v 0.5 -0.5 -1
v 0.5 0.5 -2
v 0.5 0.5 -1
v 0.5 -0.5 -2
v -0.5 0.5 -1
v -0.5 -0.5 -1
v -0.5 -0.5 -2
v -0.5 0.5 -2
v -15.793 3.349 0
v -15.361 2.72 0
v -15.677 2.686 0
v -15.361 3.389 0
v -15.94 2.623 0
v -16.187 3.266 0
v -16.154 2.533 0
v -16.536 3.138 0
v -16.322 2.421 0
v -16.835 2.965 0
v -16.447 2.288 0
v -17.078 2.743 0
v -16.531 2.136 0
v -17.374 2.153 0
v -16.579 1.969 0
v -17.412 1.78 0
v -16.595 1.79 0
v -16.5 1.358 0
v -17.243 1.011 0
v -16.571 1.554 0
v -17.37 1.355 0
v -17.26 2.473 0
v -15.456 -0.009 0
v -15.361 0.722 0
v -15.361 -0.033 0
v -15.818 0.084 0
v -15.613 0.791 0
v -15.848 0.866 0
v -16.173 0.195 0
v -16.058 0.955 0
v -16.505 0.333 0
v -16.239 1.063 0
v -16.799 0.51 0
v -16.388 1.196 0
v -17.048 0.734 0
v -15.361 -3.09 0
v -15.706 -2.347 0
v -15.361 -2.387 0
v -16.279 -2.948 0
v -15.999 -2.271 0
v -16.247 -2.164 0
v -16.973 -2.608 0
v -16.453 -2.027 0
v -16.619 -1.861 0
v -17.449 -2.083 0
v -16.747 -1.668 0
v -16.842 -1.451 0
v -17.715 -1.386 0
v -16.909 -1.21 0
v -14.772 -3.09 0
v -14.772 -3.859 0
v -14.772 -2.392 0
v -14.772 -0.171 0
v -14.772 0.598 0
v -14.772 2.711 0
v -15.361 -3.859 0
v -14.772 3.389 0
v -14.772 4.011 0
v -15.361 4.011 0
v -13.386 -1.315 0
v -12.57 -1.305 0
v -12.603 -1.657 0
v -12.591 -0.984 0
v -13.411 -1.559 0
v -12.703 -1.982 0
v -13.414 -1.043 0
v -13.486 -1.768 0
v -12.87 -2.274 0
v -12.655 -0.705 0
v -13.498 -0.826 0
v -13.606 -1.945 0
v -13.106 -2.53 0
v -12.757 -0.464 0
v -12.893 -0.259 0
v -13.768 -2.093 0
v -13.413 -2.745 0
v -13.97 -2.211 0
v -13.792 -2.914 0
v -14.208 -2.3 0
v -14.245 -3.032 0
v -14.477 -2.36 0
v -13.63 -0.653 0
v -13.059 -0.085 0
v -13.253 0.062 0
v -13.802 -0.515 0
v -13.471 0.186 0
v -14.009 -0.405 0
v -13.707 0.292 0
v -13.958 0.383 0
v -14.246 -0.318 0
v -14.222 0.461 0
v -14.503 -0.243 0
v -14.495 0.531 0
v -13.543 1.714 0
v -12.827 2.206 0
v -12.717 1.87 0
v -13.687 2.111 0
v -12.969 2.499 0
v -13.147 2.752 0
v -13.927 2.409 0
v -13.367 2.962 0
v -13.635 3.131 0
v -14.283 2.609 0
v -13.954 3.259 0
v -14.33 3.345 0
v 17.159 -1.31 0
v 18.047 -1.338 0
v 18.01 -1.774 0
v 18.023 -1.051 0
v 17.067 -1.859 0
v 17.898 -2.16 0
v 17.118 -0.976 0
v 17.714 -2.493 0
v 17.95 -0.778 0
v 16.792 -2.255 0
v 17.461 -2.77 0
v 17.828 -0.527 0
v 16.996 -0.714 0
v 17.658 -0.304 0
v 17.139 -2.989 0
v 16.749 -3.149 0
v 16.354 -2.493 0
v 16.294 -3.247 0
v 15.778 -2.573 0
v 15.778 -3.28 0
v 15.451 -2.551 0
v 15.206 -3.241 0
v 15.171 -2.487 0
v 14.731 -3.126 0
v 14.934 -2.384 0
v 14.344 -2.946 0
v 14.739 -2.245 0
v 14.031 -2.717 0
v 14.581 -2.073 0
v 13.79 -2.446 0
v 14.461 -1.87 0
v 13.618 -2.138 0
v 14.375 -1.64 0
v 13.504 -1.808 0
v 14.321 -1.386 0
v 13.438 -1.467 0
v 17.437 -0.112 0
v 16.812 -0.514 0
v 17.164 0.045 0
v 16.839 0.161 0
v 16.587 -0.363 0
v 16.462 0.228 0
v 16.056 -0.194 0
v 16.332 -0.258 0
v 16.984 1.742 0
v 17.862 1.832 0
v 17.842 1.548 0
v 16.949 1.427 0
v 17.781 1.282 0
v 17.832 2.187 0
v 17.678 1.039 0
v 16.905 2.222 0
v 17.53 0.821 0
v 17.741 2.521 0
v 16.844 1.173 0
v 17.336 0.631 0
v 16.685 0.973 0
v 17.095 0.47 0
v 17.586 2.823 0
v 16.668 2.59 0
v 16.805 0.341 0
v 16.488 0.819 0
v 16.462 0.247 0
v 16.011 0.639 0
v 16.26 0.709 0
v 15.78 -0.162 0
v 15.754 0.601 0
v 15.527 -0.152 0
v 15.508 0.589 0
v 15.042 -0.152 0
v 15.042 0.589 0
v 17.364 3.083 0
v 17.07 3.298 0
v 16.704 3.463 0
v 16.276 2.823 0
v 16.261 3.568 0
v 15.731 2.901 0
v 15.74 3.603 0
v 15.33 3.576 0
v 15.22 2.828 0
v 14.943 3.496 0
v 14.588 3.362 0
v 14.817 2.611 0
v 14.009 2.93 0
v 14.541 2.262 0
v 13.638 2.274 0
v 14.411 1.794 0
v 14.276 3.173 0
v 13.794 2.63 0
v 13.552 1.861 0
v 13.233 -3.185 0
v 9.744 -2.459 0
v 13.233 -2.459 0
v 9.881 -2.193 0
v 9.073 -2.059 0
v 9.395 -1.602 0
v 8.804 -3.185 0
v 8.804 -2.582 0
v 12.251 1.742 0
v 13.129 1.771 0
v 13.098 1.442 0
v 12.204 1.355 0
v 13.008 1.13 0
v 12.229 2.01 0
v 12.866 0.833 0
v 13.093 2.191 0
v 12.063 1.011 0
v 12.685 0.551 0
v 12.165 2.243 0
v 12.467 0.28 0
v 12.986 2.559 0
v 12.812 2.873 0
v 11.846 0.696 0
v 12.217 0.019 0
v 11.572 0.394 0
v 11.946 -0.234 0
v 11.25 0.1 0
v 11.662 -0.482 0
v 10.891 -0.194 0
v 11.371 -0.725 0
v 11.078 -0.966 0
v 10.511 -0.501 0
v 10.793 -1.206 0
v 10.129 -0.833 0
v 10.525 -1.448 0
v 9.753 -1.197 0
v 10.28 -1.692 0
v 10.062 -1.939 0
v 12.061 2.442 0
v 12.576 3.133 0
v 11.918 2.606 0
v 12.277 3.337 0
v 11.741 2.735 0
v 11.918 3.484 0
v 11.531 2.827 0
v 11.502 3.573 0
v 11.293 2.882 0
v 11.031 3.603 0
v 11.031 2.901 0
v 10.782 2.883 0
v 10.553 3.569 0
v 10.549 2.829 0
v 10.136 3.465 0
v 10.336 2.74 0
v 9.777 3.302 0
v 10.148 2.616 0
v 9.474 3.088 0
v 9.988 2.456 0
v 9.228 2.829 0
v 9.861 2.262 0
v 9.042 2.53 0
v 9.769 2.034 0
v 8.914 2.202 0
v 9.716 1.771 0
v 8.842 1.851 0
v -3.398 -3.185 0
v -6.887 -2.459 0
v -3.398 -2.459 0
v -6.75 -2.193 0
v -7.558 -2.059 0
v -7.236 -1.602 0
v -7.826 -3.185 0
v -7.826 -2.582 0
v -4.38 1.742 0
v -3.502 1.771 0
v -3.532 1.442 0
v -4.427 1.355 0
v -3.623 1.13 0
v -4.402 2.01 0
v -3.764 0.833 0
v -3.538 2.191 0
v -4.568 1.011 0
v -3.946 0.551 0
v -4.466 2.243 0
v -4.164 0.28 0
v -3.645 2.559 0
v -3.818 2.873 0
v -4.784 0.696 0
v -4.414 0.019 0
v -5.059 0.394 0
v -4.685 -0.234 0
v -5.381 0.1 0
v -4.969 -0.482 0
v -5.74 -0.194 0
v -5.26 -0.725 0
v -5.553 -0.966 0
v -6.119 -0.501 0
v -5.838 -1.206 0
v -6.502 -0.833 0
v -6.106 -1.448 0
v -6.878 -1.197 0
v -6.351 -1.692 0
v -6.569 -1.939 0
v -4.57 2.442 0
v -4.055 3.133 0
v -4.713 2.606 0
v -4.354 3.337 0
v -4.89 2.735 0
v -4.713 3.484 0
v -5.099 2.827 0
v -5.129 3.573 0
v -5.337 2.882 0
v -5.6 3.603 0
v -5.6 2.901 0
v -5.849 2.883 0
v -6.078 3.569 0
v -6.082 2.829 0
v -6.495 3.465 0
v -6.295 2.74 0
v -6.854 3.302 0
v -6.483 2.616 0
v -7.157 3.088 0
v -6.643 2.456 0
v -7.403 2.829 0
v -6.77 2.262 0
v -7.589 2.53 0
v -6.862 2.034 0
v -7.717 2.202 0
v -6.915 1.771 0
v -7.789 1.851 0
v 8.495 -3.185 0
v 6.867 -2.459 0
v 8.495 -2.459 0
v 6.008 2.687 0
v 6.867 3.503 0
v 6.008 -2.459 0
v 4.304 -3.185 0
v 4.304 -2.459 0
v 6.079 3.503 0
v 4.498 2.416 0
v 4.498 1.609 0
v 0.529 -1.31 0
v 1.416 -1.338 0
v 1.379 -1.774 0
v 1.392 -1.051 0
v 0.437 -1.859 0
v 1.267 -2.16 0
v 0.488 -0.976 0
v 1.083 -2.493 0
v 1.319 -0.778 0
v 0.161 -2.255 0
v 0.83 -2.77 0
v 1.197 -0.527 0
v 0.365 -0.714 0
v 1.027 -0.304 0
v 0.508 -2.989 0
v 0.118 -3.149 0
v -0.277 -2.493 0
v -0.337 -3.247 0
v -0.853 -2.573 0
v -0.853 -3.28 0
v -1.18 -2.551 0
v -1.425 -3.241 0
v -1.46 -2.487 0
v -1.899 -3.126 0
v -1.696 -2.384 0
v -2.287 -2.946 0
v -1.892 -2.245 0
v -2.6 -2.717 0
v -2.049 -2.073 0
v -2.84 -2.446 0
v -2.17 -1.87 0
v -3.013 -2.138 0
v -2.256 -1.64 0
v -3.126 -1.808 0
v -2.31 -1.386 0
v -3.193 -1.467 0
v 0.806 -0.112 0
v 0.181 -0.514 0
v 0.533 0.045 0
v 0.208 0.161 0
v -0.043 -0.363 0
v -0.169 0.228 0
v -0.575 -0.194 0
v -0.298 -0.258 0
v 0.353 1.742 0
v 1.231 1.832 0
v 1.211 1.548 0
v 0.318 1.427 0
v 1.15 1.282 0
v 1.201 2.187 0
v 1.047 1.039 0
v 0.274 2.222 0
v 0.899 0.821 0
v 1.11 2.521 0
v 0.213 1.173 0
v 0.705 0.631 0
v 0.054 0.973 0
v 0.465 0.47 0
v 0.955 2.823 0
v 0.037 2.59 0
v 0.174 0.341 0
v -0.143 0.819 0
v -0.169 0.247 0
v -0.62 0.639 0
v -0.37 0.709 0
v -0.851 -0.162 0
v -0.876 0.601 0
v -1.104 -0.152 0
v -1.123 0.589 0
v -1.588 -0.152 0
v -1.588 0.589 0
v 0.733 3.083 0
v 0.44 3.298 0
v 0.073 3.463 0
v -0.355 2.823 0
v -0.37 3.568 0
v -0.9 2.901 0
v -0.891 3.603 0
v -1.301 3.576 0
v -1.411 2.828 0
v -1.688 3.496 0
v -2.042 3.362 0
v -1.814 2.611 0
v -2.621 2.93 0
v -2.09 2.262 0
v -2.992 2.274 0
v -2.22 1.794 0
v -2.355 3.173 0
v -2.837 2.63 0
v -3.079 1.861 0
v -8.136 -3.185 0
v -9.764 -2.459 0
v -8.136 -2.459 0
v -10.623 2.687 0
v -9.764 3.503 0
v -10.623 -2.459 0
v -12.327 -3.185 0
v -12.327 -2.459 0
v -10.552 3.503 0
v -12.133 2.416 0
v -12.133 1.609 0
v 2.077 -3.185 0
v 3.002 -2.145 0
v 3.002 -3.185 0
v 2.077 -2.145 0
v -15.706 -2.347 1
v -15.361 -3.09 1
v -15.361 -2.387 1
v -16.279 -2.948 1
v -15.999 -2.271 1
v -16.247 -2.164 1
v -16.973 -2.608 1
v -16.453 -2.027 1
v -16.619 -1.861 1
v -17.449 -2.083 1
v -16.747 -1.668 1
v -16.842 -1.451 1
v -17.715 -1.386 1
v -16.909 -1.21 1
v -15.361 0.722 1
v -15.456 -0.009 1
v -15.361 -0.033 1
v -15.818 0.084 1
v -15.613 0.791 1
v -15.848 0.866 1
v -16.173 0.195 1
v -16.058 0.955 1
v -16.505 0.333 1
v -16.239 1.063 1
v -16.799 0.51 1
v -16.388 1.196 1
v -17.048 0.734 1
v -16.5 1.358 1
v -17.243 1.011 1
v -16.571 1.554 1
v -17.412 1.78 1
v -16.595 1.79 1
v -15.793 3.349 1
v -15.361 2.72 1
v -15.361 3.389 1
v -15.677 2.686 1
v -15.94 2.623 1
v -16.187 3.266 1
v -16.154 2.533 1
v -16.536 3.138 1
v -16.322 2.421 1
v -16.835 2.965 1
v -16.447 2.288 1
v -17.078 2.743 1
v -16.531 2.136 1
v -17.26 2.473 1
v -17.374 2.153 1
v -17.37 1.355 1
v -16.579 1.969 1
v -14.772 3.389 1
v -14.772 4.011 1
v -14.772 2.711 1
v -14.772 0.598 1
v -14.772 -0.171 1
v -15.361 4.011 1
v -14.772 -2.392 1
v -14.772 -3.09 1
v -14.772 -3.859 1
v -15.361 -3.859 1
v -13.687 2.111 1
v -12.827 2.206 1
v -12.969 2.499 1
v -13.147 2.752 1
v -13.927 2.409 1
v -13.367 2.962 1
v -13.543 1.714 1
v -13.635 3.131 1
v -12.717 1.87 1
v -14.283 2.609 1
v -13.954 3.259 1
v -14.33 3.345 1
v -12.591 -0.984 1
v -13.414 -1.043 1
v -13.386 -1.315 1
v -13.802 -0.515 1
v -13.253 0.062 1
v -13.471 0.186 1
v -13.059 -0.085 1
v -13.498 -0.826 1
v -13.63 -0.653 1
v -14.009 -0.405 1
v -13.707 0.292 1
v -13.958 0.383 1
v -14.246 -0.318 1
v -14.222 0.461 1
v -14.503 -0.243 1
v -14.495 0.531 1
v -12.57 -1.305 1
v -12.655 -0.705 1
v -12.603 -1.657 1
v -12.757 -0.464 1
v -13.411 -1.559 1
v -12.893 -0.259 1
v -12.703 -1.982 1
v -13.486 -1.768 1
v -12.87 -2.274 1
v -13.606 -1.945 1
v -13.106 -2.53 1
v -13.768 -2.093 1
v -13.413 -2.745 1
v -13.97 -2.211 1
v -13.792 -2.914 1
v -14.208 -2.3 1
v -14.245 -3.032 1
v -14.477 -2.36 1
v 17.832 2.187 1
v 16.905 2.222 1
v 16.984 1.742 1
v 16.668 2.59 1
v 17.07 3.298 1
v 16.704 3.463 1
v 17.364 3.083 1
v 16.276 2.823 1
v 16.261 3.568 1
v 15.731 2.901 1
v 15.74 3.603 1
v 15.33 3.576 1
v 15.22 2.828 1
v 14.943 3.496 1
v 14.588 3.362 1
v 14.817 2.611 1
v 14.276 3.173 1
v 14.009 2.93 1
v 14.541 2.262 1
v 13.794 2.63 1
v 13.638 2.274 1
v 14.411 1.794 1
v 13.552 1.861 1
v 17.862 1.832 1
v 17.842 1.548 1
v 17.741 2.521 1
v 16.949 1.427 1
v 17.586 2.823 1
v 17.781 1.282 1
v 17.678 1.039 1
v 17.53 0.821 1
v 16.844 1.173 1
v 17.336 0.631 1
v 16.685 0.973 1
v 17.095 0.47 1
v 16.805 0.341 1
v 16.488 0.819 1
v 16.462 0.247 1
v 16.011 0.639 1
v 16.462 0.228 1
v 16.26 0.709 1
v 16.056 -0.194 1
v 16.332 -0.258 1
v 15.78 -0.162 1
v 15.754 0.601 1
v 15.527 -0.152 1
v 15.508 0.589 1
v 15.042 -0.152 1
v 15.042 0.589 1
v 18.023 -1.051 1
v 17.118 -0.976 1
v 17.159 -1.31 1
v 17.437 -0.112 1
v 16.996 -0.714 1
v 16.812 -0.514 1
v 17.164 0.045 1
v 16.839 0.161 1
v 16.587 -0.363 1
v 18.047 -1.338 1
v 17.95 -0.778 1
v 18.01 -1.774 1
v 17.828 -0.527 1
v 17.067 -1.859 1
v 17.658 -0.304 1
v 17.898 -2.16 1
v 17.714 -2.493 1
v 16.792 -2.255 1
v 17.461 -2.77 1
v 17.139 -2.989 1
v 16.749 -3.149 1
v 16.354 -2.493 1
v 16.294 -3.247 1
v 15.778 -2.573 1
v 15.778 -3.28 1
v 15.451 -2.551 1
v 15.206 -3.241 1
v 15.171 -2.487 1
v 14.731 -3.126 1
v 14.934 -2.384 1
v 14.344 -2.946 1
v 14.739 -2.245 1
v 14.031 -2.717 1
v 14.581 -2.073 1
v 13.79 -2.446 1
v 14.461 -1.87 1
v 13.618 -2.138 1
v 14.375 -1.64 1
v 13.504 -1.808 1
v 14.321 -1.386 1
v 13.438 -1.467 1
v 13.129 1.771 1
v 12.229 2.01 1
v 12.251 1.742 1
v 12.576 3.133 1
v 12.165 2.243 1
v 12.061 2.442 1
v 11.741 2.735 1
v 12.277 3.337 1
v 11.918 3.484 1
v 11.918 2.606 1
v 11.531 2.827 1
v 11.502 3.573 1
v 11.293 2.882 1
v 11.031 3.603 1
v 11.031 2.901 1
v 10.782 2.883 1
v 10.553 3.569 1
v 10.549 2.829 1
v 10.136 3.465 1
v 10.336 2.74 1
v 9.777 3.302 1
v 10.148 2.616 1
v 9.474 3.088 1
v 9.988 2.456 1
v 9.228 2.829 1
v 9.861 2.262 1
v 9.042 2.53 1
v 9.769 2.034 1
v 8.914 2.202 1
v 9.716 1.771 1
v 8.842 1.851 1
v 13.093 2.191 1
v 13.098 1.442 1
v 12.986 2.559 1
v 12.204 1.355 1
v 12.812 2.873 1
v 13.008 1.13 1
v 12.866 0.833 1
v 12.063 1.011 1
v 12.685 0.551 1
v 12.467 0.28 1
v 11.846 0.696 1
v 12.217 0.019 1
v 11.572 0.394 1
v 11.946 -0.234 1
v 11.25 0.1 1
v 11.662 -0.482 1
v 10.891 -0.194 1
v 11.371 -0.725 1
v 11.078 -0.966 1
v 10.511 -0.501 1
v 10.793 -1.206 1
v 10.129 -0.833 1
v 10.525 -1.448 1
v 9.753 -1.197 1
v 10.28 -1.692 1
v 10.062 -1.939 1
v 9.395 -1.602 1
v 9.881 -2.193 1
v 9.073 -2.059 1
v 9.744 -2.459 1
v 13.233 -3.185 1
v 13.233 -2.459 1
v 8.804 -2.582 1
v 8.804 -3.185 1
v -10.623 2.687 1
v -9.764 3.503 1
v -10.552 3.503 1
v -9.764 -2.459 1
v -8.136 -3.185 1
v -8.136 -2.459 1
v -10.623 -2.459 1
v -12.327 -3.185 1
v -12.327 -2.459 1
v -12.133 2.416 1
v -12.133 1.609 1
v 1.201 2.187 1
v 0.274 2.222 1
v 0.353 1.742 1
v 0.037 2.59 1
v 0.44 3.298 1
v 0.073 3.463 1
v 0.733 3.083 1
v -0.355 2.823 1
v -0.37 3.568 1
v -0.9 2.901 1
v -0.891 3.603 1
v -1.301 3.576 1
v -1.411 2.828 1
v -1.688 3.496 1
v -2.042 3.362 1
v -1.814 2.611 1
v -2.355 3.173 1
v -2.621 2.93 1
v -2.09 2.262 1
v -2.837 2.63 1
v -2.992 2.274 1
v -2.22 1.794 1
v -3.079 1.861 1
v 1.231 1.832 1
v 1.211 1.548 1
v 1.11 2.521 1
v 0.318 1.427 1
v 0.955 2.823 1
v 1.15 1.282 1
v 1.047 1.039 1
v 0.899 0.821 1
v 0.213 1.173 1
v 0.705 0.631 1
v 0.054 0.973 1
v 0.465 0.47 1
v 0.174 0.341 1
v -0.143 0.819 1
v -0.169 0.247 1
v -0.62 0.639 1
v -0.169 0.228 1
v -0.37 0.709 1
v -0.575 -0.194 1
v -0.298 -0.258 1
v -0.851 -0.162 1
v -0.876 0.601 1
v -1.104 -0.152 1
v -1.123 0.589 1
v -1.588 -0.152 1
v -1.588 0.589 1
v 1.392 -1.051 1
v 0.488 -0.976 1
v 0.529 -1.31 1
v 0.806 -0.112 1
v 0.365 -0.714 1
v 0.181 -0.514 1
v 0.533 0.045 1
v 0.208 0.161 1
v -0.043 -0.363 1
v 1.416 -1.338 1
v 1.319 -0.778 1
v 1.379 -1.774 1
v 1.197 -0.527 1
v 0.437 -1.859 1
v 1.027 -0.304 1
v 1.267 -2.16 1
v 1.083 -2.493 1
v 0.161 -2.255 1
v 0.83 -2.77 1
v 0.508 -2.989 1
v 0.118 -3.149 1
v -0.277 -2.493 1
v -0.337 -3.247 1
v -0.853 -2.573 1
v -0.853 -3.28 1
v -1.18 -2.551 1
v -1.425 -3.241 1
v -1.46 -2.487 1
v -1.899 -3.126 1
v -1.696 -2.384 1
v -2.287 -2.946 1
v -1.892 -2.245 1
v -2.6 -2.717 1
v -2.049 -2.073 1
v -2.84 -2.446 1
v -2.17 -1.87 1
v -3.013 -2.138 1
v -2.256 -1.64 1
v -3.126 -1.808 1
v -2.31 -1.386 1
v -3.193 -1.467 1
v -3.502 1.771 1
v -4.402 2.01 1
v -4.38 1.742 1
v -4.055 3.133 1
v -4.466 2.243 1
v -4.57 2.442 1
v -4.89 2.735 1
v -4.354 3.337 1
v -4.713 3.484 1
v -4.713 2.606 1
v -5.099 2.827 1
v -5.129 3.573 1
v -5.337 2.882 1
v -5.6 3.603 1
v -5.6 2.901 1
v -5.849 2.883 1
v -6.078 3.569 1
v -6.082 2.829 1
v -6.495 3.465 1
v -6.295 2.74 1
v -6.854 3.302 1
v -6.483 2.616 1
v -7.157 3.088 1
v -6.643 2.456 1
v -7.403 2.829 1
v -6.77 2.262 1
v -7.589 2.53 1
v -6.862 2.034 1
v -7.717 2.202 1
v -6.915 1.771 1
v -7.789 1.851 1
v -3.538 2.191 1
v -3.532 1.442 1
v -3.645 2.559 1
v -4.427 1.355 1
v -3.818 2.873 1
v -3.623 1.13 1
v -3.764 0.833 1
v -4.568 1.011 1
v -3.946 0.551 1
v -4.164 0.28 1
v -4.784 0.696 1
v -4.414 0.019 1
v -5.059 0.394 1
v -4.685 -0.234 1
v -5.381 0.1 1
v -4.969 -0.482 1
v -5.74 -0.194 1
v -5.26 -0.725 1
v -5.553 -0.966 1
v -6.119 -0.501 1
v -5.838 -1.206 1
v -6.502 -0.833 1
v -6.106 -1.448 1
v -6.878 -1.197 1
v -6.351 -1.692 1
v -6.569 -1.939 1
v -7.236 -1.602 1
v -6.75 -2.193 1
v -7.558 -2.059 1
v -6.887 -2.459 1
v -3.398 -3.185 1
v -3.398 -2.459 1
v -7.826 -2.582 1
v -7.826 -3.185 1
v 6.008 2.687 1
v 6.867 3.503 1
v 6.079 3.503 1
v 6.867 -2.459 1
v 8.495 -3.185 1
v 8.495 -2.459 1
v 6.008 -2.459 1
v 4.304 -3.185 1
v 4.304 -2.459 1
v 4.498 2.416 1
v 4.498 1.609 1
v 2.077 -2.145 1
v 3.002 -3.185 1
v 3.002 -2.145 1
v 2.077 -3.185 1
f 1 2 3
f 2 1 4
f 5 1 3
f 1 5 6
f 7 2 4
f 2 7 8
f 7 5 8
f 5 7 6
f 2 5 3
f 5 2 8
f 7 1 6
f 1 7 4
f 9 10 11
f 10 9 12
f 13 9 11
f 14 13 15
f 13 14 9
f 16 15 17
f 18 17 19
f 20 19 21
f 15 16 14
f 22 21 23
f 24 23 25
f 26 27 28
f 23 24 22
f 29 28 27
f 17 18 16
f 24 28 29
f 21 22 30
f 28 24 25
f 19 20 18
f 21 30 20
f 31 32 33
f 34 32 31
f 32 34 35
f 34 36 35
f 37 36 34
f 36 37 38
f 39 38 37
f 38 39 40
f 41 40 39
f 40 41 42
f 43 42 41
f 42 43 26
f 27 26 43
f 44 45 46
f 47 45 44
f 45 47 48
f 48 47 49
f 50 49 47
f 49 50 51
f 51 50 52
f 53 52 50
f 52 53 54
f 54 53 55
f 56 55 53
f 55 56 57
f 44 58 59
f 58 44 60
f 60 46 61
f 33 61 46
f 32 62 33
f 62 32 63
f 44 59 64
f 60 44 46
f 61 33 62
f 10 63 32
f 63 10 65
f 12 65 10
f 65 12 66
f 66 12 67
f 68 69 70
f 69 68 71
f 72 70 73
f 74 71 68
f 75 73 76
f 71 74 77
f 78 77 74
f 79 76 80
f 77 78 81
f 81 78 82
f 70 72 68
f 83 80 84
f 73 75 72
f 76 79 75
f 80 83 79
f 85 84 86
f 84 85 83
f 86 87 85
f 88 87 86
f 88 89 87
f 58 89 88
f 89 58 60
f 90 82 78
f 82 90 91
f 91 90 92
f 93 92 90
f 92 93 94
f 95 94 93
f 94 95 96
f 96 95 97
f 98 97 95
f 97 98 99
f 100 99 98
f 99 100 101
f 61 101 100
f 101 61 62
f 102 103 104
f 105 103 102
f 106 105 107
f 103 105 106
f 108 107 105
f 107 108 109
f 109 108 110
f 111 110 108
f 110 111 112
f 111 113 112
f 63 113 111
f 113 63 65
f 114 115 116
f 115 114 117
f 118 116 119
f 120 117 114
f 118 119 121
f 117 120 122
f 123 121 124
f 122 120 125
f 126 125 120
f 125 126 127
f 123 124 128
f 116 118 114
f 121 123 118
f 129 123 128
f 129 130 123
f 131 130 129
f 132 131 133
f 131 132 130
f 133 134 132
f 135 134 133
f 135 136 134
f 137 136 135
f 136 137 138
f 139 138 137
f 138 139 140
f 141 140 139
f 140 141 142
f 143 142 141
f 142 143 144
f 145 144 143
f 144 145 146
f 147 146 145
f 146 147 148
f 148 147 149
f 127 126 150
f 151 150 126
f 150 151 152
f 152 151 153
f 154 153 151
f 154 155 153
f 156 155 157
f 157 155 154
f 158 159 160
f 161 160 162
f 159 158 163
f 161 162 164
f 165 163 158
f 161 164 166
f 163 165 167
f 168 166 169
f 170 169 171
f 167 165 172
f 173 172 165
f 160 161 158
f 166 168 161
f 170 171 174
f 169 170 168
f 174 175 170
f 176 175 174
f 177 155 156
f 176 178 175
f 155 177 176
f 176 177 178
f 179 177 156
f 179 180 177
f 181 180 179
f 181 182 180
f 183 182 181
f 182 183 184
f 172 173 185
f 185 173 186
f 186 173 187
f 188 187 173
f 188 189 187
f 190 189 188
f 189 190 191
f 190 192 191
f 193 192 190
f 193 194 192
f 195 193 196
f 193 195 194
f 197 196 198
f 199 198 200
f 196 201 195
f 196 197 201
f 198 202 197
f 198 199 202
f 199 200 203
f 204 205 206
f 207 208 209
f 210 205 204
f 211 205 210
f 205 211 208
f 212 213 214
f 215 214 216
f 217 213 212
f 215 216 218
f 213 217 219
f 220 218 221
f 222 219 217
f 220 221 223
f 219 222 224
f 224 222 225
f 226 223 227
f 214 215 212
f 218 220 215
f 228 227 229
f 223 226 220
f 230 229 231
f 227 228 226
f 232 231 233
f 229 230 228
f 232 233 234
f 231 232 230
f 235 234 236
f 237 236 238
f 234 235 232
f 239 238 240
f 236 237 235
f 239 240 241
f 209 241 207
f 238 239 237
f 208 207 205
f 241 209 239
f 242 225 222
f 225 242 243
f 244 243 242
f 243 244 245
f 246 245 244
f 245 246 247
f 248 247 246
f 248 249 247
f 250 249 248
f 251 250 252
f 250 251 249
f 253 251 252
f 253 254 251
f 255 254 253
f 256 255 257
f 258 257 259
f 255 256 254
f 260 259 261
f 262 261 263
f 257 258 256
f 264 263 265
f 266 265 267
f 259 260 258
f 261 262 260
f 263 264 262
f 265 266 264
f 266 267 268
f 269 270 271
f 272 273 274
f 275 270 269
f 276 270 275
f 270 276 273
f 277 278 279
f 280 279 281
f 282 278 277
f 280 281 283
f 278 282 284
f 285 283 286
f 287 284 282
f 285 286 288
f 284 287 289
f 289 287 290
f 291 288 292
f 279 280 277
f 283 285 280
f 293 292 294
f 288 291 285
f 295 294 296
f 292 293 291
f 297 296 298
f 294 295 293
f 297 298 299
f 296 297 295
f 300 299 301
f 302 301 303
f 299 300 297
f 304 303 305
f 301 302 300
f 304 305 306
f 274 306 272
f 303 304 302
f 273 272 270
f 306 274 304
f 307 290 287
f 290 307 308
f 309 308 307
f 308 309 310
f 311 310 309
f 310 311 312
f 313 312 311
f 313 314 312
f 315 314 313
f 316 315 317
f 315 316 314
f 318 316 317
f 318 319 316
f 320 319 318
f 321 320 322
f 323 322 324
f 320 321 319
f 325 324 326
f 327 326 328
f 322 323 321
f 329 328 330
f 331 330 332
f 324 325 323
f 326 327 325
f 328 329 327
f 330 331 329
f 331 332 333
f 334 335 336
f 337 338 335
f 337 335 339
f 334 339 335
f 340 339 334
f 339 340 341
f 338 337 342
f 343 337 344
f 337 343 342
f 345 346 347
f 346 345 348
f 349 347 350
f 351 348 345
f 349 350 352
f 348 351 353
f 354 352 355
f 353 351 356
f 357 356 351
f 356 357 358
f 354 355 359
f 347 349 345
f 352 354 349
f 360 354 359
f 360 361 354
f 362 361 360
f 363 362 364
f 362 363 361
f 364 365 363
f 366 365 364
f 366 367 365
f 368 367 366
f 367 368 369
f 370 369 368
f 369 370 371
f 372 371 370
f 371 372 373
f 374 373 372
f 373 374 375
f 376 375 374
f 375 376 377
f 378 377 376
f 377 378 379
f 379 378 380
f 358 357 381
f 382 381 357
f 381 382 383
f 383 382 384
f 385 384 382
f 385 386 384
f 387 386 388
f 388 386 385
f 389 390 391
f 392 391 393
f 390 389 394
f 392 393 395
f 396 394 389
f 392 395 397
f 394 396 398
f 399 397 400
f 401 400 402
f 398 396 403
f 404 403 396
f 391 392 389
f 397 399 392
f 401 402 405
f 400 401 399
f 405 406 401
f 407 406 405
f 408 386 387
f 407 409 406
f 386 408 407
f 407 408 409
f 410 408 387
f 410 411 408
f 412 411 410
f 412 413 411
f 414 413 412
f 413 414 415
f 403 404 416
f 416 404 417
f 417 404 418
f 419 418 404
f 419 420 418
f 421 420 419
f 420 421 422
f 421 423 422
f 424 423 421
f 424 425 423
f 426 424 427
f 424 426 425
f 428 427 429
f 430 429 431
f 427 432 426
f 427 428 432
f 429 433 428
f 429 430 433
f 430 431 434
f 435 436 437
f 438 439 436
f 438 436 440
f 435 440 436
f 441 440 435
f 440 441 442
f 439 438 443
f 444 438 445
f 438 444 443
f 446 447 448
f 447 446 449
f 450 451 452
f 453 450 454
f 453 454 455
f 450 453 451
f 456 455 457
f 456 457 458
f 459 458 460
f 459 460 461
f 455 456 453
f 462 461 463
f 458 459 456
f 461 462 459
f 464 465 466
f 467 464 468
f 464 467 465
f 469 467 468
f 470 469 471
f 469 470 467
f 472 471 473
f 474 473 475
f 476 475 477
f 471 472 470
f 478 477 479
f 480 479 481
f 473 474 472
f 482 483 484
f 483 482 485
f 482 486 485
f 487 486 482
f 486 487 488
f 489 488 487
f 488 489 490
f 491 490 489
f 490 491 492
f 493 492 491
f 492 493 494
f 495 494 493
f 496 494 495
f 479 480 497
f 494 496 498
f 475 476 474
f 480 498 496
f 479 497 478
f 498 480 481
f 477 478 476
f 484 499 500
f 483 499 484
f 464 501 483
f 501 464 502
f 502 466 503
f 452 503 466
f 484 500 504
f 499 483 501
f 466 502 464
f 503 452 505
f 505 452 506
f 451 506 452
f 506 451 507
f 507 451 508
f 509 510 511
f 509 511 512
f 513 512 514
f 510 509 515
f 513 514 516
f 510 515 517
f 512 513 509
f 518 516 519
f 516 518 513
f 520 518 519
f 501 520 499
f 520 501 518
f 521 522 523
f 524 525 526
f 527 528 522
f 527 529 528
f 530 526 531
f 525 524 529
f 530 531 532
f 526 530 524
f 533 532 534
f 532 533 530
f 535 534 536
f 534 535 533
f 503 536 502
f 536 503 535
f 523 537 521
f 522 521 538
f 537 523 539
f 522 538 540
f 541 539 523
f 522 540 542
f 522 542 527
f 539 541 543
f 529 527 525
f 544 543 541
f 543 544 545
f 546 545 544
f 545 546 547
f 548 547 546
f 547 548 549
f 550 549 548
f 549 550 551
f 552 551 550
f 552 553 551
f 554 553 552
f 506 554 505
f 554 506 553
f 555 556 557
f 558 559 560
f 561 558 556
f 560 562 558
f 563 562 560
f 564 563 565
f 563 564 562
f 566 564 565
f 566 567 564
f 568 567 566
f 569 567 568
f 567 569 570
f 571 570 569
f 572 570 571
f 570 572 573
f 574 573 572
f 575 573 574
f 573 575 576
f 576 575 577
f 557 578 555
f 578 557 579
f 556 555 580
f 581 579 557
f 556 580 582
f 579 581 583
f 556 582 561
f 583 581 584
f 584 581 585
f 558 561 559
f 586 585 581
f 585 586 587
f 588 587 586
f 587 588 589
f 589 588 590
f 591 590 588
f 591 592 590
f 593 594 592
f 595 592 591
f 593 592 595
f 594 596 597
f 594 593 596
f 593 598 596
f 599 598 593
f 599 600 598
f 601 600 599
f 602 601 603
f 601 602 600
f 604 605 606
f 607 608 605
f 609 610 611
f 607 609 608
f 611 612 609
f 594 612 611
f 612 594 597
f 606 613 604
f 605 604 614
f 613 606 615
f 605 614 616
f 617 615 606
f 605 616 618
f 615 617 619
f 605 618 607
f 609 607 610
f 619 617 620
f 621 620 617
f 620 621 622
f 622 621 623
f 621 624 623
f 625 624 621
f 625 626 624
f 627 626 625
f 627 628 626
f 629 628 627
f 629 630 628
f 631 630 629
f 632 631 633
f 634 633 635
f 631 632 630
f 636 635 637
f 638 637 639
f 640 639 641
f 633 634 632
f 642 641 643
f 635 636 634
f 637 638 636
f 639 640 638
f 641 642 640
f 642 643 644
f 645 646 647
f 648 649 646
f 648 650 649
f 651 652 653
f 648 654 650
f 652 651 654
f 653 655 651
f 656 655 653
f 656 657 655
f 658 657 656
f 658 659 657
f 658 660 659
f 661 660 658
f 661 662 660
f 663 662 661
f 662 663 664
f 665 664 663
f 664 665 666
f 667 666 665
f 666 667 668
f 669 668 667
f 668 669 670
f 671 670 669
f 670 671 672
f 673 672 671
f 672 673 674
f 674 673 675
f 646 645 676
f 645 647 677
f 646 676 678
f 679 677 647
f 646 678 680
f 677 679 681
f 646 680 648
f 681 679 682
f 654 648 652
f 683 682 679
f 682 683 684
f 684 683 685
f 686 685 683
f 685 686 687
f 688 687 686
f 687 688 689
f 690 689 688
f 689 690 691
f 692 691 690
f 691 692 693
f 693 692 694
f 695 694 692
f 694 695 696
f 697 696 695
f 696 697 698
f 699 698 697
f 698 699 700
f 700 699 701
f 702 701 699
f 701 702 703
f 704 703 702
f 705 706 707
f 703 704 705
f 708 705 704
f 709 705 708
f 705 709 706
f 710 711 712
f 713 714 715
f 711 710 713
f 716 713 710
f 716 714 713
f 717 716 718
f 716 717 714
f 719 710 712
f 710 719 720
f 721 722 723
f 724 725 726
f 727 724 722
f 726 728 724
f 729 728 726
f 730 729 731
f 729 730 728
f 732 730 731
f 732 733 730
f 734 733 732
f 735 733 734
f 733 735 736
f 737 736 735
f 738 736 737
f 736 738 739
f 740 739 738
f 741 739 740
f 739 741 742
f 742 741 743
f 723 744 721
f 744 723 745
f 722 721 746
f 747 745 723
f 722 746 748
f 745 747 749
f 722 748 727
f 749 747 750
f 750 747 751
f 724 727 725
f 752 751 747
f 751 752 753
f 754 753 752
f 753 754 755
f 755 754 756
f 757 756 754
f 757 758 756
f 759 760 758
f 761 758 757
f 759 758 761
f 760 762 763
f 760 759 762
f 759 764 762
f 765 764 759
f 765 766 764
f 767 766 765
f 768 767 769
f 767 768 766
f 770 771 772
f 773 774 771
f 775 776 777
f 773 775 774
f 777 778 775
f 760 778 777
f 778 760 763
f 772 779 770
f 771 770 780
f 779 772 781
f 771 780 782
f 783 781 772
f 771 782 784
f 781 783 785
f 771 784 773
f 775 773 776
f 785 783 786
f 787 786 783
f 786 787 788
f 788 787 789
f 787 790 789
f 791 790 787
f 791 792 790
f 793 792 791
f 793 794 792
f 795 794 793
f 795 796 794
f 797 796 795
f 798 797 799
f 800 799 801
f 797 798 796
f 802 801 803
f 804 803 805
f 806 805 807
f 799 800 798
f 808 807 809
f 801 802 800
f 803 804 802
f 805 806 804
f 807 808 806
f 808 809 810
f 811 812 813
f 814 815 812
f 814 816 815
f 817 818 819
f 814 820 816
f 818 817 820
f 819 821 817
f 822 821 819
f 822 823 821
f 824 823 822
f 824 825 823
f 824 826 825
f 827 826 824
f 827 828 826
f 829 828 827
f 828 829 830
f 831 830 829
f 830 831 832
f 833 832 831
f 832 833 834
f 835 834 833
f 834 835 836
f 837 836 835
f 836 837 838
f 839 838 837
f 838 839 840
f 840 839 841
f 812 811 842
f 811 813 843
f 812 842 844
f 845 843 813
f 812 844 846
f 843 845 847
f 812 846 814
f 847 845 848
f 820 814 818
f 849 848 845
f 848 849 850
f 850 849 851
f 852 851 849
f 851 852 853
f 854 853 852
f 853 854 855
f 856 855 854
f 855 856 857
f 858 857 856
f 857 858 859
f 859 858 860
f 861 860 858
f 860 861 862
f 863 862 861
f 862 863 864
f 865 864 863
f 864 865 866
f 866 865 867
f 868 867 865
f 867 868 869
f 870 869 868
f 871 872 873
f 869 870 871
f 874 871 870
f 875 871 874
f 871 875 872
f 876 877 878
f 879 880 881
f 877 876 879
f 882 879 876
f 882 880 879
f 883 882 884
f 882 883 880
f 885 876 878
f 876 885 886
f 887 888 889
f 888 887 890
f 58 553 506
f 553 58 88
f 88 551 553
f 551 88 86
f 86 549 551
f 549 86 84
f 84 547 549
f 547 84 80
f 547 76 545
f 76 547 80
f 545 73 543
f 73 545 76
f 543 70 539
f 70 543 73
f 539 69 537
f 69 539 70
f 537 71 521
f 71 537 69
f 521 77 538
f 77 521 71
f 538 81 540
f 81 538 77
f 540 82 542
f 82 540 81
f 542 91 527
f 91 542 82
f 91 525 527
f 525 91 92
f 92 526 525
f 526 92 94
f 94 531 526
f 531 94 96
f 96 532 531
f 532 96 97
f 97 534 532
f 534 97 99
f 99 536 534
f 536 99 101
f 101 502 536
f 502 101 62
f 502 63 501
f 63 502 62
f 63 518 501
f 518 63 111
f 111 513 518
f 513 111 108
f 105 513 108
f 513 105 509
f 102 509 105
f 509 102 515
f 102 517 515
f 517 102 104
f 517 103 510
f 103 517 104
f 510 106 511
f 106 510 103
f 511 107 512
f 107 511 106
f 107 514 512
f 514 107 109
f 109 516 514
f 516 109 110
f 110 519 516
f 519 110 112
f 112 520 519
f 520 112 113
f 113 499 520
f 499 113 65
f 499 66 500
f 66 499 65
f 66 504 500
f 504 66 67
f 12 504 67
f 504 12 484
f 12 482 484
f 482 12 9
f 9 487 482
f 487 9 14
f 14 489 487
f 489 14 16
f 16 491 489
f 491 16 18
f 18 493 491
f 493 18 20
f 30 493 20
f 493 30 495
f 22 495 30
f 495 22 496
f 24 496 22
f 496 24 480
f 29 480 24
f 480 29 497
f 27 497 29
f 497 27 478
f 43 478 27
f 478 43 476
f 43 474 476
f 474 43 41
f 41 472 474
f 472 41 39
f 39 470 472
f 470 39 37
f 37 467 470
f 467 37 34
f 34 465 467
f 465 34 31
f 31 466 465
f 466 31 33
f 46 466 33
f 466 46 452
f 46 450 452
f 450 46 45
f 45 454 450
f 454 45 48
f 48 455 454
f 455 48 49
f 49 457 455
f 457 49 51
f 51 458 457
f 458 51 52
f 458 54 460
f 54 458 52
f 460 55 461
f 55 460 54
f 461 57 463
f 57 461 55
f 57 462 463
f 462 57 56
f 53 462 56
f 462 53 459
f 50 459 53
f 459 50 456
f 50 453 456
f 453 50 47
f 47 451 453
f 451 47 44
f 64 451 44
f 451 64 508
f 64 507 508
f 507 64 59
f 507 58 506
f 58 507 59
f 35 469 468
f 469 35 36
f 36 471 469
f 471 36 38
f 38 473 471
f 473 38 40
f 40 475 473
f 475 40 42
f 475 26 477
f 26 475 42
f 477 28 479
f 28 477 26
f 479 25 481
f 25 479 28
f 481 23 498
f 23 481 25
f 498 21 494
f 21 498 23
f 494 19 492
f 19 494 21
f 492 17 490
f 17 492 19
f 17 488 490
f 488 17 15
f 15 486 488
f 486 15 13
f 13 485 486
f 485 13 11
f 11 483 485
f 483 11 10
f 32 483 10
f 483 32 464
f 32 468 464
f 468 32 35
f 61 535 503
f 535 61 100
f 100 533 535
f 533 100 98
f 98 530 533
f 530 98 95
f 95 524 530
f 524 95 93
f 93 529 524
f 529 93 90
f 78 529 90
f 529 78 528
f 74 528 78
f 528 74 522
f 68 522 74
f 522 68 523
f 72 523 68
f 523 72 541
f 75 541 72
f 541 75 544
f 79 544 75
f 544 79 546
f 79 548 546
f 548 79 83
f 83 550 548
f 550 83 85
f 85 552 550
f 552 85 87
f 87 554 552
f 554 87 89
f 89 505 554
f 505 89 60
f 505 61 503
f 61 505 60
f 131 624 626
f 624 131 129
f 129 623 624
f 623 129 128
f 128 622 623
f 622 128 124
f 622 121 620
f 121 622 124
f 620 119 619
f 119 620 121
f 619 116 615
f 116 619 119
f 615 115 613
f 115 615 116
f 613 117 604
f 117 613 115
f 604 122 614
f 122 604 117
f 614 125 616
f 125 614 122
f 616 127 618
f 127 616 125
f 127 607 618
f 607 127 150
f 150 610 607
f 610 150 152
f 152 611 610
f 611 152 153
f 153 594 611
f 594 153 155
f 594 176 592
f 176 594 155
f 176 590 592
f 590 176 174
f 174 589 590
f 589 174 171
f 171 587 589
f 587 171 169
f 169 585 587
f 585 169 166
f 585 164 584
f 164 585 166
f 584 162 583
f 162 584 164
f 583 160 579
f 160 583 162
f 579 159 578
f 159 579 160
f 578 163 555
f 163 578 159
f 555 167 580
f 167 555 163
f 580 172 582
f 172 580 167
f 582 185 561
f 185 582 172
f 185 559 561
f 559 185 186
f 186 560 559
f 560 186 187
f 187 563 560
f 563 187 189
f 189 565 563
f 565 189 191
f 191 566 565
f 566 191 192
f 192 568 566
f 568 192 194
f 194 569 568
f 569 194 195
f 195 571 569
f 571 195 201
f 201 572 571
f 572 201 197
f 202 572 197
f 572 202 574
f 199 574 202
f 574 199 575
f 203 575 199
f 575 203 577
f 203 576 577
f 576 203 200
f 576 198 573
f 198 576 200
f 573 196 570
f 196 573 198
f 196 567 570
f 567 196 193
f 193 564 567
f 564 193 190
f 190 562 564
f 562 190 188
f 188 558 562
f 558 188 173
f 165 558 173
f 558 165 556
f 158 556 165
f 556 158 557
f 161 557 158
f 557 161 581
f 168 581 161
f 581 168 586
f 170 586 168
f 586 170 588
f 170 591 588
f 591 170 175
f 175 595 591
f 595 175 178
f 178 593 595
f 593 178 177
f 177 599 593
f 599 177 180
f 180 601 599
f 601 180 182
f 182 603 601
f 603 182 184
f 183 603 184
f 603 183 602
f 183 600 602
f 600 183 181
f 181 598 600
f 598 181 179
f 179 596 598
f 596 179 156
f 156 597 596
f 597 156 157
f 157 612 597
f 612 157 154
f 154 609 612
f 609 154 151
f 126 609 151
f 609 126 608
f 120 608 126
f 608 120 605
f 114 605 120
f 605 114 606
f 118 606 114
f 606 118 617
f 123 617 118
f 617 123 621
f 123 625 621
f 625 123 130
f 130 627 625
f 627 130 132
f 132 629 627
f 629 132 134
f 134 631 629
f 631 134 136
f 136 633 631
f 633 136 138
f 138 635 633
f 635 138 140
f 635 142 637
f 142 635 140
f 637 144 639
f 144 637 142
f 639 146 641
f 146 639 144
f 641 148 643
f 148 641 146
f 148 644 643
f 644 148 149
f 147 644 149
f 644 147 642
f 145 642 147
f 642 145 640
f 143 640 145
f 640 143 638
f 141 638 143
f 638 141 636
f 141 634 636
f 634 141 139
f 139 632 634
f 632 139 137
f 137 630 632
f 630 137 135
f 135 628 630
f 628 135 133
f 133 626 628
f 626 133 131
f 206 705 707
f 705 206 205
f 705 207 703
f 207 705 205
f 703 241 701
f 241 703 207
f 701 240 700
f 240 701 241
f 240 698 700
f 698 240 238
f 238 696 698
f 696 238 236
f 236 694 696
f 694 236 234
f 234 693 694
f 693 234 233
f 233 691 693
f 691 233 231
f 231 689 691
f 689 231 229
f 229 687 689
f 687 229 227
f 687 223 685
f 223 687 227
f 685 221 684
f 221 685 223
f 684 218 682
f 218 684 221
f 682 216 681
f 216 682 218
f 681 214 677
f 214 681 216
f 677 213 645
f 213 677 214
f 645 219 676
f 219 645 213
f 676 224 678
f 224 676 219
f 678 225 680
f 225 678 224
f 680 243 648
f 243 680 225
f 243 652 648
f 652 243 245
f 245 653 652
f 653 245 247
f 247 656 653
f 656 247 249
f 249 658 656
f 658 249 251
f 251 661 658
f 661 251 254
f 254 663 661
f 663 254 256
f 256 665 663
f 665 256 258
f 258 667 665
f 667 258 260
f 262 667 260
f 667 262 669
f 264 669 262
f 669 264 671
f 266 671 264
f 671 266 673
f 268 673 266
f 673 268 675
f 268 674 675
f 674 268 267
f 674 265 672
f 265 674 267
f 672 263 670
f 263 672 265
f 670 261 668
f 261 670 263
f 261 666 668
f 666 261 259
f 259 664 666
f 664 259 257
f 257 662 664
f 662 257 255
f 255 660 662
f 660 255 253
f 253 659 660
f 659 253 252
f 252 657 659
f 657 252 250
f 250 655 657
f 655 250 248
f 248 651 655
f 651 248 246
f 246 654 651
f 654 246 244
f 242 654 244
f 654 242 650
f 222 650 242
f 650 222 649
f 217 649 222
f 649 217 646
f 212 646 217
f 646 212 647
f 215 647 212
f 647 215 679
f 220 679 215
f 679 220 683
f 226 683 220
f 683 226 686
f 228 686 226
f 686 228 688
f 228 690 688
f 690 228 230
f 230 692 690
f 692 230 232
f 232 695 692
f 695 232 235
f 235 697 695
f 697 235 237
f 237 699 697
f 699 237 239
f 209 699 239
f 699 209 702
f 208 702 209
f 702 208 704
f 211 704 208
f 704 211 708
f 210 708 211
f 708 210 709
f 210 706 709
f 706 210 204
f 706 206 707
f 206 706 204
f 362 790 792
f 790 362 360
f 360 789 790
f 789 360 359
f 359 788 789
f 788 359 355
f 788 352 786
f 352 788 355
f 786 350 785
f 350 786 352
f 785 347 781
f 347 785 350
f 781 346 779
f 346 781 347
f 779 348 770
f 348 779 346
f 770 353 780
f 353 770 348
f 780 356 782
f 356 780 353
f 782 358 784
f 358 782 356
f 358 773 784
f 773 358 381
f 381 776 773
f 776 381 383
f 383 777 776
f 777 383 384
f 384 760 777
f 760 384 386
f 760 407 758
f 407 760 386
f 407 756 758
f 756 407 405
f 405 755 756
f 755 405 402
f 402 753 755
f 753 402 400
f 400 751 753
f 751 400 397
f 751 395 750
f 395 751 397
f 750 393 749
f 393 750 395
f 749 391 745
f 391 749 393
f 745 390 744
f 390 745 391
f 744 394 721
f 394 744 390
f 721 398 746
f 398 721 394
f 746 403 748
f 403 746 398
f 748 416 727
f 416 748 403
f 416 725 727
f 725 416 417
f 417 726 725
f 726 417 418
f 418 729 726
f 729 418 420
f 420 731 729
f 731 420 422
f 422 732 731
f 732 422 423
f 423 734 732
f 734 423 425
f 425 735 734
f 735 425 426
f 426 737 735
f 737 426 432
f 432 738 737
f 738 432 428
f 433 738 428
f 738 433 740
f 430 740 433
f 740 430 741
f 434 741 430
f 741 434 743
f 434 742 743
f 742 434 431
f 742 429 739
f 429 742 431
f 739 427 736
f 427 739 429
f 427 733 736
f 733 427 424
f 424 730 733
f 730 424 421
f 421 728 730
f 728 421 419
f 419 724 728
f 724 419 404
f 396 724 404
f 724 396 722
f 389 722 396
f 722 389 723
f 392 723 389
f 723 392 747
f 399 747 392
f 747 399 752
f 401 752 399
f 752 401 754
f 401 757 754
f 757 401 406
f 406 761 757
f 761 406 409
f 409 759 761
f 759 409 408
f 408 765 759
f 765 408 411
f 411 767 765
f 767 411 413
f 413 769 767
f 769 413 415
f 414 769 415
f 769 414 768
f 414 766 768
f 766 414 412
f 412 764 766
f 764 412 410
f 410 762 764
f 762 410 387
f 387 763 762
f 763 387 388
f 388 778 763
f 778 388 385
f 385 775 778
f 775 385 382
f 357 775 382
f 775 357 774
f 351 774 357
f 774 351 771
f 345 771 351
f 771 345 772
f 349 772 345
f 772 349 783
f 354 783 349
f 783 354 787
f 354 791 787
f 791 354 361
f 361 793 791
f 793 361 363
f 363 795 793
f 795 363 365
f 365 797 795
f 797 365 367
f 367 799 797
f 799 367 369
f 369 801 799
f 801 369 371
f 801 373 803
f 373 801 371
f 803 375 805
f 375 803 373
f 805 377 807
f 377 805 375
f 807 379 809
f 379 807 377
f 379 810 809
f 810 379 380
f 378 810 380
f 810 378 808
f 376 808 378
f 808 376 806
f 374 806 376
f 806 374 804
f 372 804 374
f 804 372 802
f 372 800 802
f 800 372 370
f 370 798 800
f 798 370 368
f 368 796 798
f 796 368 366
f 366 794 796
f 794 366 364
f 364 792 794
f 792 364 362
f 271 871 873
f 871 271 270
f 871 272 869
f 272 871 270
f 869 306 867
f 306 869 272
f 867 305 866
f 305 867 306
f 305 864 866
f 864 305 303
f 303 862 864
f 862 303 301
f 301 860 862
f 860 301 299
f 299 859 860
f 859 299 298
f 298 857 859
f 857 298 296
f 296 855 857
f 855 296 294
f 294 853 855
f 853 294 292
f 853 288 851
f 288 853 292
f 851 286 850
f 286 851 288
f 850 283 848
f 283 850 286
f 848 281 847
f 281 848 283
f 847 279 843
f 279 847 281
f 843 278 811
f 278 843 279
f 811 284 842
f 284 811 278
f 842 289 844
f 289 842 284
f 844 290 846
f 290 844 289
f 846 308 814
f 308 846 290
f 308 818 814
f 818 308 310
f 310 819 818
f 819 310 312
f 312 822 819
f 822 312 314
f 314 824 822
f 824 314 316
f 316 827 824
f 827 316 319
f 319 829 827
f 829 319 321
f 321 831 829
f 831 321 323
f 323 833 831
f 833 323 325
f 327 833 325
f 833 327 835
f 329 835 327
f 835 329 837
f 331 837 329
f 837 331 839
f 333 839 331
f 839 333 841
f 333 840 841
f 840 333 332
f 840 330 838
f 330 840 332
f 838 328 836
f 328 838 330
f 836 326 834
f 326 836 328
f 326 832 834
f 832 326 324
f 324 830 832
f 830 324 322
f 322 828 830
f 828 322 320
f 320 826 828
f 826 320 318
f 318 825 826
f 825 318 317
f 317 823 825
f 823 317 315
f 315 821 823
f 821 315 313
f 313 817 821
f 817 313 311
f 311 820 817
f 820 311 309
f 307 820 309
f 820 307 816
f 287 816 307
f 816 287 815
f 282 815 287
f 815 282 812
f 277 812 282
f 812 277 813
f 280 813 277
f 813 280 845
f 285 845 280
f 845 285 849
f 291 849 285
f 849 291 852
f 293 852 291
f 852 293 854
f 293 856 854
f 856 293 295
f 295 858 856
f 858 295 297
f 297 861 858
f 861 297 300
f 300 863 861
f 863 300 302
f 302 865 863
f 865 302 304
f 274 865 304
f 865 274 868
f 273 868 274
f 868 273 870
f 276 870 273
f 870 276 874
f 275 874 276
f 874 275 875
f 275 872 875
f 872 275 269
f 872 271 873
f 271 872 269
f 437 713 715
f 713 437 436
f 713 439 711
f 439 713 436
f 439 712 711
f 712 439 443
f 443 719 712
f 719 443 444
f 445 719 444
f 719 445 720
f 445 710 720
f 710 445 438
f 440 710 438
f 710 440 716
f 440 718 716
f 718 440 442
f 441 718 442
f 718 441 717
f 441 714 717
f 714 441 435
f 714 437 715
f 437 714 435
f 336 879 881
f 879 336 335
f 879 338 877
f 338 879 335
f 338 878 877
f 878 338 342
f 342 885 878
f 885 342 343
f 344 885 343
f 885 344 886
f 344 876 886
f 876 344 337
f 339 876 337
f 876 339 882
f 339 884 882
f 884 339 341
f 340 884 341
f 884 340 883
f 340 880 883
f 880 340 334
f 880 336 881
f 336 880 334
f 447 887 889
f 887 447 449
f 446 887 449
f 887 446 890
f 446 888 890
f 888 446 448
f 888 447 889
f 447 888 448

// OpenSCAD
// file: fontmetricsdata.scad
FONT_PlaywriteFRTrad = [
 ["PlaywriteFRTrad", // family
 0], // style
 1927, // ascender
 -925, // descender
 0, // line gap
 1000.000000, // units_per_em
 [
 [chr(13),300,0,0,0,0,0,[]],
 [" ",629,63,63,-17,626,1423,[]],
 ["!",526,63,63,-19,500,519,[]],
 [chr(34),366,-54,-54,-927,436,1427,[]],
 ["#",598,63,63,-927,504,519,[]],
 ["$",651,100,100,-17,653,1423,[]],
 ["%",304,81,81,-17,301,795,[]],
 ["&",304,94,94,-17,302,515,[]],
 ["'",268,-83,-83,-927,186,795,[]],
 ["(",268,-78,-78,-927,175,515,[]],
 [")",564,100,100,-17,574,1423,[]],
 ["*",306,95,95,-17,304,1423,[]],
 ["+",963,94,94,-17,966,519,[]],
 [",",646,94,94,-17,647,519,[]],
 ["-",589,63,63,-19,526,519,[]],
 [".",598,100,100,-923,535,519,[]],
 ["/",598,63,63,-923,504,519,[]],
 ["0",1120,101,101,-19,1019,1423,[]],
 ["1",660,22,22,-14,399,1423,[]],
 ["2",974,72,72,0,868,1423,[]],
 ["3",1058,56,56,-19,938,1423,[]],
 ["4",1078,63,63,-14,1032,1428,[]],
 ["5",1058,108,108,-19,954,1398,[]],
 ["6",1137,147,147,-19,1031,1425,[]],
 ["7",859,27,27,-22,841,1398,[]],
 ["8",1058,85,85,-19,973,1423,[]],
 ["9",1137,106,106,-17,990,1427,[]],
 [chr(165),994,28,28,-14,966,1424,[]],
 [chr(180),645,251,251,610,446,839,[]],
 [chr(567),316,-139,-139,-927,329,515,[]],
 [chr(710),645,146,146,610,501,839,[]],
 [chr(711),645,146,146,616,501,845,[]],
 [chr(786),0,-49,-49,621,69,851,[]],
 [chr(795),0,0,0,453,229,714,[]],
 [chr(803),0,-56,-56,-235,56,-109,[]],
 [chr(806),0,-74,-74,-297,44,-74,[]],
 [chr(807),0,-130,-130,-269,119,13,[]],
 [chr(808),0,-115,-115,-257,108,20,[]],
 [chr(821),0,-178,-178,306,165,379,[]],
 [chr(822),0,-583,-583,304,584,381,[]],
 [chr(823),0,-158,-158,244,181,454,[]],
 [chr(824),0,-203,-203,-60,202,585,[]],
 [chr(7838),1261,192,192,-19,1159,1423,[]],
 [chr(8201),100,0,0,0,0,0,[]],
 [chr(8211),625,60,60,301,565,381,[]],
 [chr(8212),1250,60,60,301,1190,381,[]],
 [chr(8216),214,44,44,917,184,1282,[]],
 [chr(8217),217,31,31,917,171,1282,[]],
 [chr(8218),237,35,35,-282,192,84,[]],
 [chr(8220),409,44,44,917,379,1282,[]],
 [chr(8221),412,31,31,917,365,1282,[]],
 [chr(8222),423,35,35,-282,378,84,[]],
 [chr(8226),459,63,63,81,396,469,[]],
 [chr(8230),848,94,94,-34,754,96,[]],
 [chr(8242),240,78,78,1138,200,1453,[]],
 [chr(8243),419,78,78,1138,379,1453,[]],
 [chr(8249),475,94,94,-14,380,515,[]],
 [chr(8250),475,95,95,-14,381,515,[]],
 [chr(8364),1138,5,5,-19,1083,1423,[]],
 [chr(8482),960,23,23,953,870,1398,[]],
 [chr(8719),1076,13,13,-82,1063,1398,[]],
 [chr(8722),763,88,88,398,675,478,[]],
 [chr(8747),626,3,3,-75,625,1417,[]],
 [chr(8776),763,75,75,179,688,694,[]],
 [chr(8800),763,88,88,54,675,819,[]],
 [chr(8804),763,88,88,83,680,707,[]],
 [chr(8805),763,83,83,83,675,707,[]],
 [chr(9676),775,50,50,-75,725,596,[]],
 ]
];

FONTS = [ FONT_PlaywriteFRTrad ];
// file: fontmetrics.scad
include <fontmetricsdata.scad>;

// begin MIT licensed code (c) 2018 Alexander Pruss
BOLD = 1;
ITALIC = 2;
CONDENSED = 32;
ASCENDER_TO_EM = 1510/2048; 

_XADVANCE = 1;
_LSB = 2;
_XMIN = 3;
_YMIN = 4;
_XMAX = 5;
_YMAX = 6;
_KERN = 7;


function fontScale(f) = 1 / (ASCENDER_TO_EM * f[3]);

function _isString(v) = v >= "";
function _isVector(v) = !(v>="") && len(v) != undef;
function _isFloat(v) = v+0 != undef;

function startswith(a,b,offset=0,position=0) =
    len(a)-offset < len(b) ? false : 
    position >= len(b) ? true :
    a[offset+position] != b[position] ? false :
    startswith(a,b,offset=offset,position=position+1);

function findsubstring(a,b,position=0) =
    len(a)-position < len(b) ? -1 :
    startswith(a,b,offset=position) ? position :
    findsubstring(a,b,position=position+1);
    
function style(a,b,n) =
    findsubstring(a,b) >= 0 ? n : 0;
    
function substring(a,start,end=undef,soFar="") =
    start >= len(a) || (end != undef && start >= end) ? soFar :
    substring(a,start+1,end=end,soFar=str(soFar,a[start]));
    
function lowercaseChar(c) = 
    c < "A" || c > "Z" ? c :
    chr(search(c,"ABCDEFGHIJKLMNOPQRSTUVWXYZ")[0]+97);
    
function lowercase(s,start=0,soFar="") =
    start >= len(s) ? soFar :
    lowercase(s,start=start+1,soFar=str(soFar,lowercaseChar(s[start])));
    
function styleNumber(s) = 
    style(s, "bold", BOLD) + 
    style(s, "italic", ITALIC) + 
    style(s, "oblique", ITALIC) +
    style(s, "condensed", CONDENSED);

function familyAndStyle(s) =
    let(lc=lowercase(s),
        n=findsubstring(lc,":style="))
    n < 0 ? [s, 0] :
    [substring(s,0,n), styleNumber(substring(lc,n+7))];
    
function findEntry(data, index) = data[search([index], data, 1, 0)[0]];
    
function findEntry_recursive(data, index, offset=0) =
    offset >= len(data) ? undef :
    data[offset][0] == index ? data[offset] :
    findEntry(data, index, offset=offset+1);
    
function findFont(fonts, s) = 
    _isString(s) ? findEntry(fonts, familyAndStyle(s)) : s;

function getGlyphInfo(font,char) =
    findEntry(font[4],char);

function measureWithFontAt(string,font,offset) =
    let(g=getGlyphInfo(font,string[offset]))
    g == undef ? 0 :
    offset + 1 >= len(string) ? g[1] : // at end of string
    let(kern=findEntry(g[_KERN], string[offset+1]))
    kern == undef ? g[1] :
    g[1] + kern[1];
    
function measureWithFont(string, font, offset=0, soFar=0) =
    offset >= len(string) ? soFar :
    measureWithFont(string,font,offset=offset+1,soFar=soFar+measureWithFontAt(string,font,offset));
    
function getOffsets(string, font, soFar=[0]) =
    len(soFar) >= len(string)+1 ? soFar :
    getOffsets(string, font, soFar=concat(soFar, [soFar[len(soFar)-1]+measureWithFontAt(string, font, offset=len(soFar)-1) ]));
    
function measureText(text="", font="Arial", size=10., spacing=1., fonts=FONTS) = 
    let(f=findFont(FONTS, font))
    spacing * size * fontScale(f) * measureWithFont(text, f);

function ascender(font="Arial", size=10., fonts=FONTS) =
    let(f=findFont(fonts, font))
    fontScale(f)*size*f[1];

function descender(font="Arial", size=10., fonts=FONTS) =
    let(f=findFont(fonts, font))
    -fontScale(f)*size*f[2];
    
function maximizeGlyphMetric(text,f,mult,index,offset=0,soFar=-1e100) =
    len(text) == 0 ? 0 :
    offset >= len(text) ? soFar :
    maximizeGlyphMetric(text,f,mult,index,offset=offset+1,
        soFar=max(soFar,mult*getGlyphInfo(f, text[offset])[index]));
    
function measureTextDescender(text="", size=10, font="Arial", fonts=FONTS) = 
    let(f=findFont(fonts, font))
    -fontScale(f)*size*maximizeGlyphMetric(text,f,-1,_YMIN);
    
//echo(getGlyphInfo(f, "a")[_

function measureTextAscender(text="", size=10, font="Arial", fonts=FONTS) = 
    let(f=findFont(fonts, font))
    fontScale(f)*size*maximizeGlyphMetric(text,f,1,_YMAX);

function measureTextLeftBearing(text="", size=10, font="Arial", fonts=FONTS) = 
    len(text)==0 ? 0 : (
    let(f=findFont(fonts,font), 
        g=getGlyphInfo(f, text[0]))
    g == undef ? 0 : fontScale(f)*size*g[_LSB] );
    
function measureTextRightBearing(text="", size=10, font="Arial", fonts=FONTS) = 
    len(text)==0 ? 0 : (
    let(f=findFont(fonts, font),
        g=getGlyphInfo(findFont(fonts, font), text[len(text)-1]))
    g == undef ? 0 : fontScale(f)*size*(g[_XMAX]-g[_XADVANCE]) );
    
module drawText(text="", size=10, font="Arial", halign="left", spacing=1, fonts=FONTS) {
    
    l = len(text);
    if (l>0) {
        sc = size < 20 ? size/20 : 1;
        adjSize = size < 20 ? 20 : size;
        f = findFont(fonts, font);
        offsetScale = spacing * adjSize * fontScale(f);
        offsets = getOffsets(text, f, size=adjSize);
        w = offsets[l+1];
        dx = halign=="right" ? -w :
             halign=="center" ? -w / 2 : 0;
        scale(sc) {
            for (i=[0:l-1]) {
                translate([offsetScale*(dx+offsets[i]),0]) text(text[i], size=adjSize, font=font);
            }
        }
    }
}
// end MIT licensed code
// main file
// First example of parameteric model
//   
//    syntax: 
//        //Description
//        variable=value; //Parameter
//        
//        This type of comment tells the name of group to which parameters below
//        this comment will belong 
//    
//       /*[ group name ]*/ 
//
use <fontmetrics.scad>;

//Below comment tells the group to which a variable will belong
/*[ properties of Sign]*/

//The resolution of the curves. Higher values give smoother curves but may increase the model render time.
resolution = 10; //[10, 20, 30, 50, 100]

//The horizontal radius of the outer ellipse of the sign.
radius = 80;//[60 : 200]

//Total height of the sign
fontHeight = 1;//[1 : 10]

/*[ Content To be written ] */

message = "$123.123";
fontSize = 7;
fontFamily = "Arial";
letterSpacing = .9;
sidePadding = 1;

length = measureText(message, font=fontFamily, size=fontSize, spacing=letterSpacing) + sidePadding;

depth = 3;

height = 9;

//Message to be write 
Message = message ; //["Welcome to...", "Happy Birthday!", "Happy Anniversary", "Congratulations", "Thank You"]

//Name of Person, company etc.

$fn = resolution;
union() {
    linear_extrude(fontHeight, true) {
    translate([0, 0]) text(Message, fontSize, fontFamily, halign = "center", valign="center", spacing = letterSpacing);
} 
difference() {
    translate([0, 0, -depth/2]) cube([length, height, depth], center = true);
    
    translate([0, -depth -0.38, -depth ]) rotate([45]) cube([length + 2, height, depth * 2], center = true);

}
}



// Written by Amarjeet Singh Kapoor <amarjeet.kapoor1@gmail.com>
//
// To the extent possible under law, the author(s) have dedicated all
// copyright and related and neighboring rights to this software to the
// public domain worldwide. This software is distributed without any
// warranty.
//
// You should have received a copy of the CC0 Public Domain
// Dedication along with this software.
// If not, see <http://creativecommons.org/publicdomain/zero/1.0/>.
